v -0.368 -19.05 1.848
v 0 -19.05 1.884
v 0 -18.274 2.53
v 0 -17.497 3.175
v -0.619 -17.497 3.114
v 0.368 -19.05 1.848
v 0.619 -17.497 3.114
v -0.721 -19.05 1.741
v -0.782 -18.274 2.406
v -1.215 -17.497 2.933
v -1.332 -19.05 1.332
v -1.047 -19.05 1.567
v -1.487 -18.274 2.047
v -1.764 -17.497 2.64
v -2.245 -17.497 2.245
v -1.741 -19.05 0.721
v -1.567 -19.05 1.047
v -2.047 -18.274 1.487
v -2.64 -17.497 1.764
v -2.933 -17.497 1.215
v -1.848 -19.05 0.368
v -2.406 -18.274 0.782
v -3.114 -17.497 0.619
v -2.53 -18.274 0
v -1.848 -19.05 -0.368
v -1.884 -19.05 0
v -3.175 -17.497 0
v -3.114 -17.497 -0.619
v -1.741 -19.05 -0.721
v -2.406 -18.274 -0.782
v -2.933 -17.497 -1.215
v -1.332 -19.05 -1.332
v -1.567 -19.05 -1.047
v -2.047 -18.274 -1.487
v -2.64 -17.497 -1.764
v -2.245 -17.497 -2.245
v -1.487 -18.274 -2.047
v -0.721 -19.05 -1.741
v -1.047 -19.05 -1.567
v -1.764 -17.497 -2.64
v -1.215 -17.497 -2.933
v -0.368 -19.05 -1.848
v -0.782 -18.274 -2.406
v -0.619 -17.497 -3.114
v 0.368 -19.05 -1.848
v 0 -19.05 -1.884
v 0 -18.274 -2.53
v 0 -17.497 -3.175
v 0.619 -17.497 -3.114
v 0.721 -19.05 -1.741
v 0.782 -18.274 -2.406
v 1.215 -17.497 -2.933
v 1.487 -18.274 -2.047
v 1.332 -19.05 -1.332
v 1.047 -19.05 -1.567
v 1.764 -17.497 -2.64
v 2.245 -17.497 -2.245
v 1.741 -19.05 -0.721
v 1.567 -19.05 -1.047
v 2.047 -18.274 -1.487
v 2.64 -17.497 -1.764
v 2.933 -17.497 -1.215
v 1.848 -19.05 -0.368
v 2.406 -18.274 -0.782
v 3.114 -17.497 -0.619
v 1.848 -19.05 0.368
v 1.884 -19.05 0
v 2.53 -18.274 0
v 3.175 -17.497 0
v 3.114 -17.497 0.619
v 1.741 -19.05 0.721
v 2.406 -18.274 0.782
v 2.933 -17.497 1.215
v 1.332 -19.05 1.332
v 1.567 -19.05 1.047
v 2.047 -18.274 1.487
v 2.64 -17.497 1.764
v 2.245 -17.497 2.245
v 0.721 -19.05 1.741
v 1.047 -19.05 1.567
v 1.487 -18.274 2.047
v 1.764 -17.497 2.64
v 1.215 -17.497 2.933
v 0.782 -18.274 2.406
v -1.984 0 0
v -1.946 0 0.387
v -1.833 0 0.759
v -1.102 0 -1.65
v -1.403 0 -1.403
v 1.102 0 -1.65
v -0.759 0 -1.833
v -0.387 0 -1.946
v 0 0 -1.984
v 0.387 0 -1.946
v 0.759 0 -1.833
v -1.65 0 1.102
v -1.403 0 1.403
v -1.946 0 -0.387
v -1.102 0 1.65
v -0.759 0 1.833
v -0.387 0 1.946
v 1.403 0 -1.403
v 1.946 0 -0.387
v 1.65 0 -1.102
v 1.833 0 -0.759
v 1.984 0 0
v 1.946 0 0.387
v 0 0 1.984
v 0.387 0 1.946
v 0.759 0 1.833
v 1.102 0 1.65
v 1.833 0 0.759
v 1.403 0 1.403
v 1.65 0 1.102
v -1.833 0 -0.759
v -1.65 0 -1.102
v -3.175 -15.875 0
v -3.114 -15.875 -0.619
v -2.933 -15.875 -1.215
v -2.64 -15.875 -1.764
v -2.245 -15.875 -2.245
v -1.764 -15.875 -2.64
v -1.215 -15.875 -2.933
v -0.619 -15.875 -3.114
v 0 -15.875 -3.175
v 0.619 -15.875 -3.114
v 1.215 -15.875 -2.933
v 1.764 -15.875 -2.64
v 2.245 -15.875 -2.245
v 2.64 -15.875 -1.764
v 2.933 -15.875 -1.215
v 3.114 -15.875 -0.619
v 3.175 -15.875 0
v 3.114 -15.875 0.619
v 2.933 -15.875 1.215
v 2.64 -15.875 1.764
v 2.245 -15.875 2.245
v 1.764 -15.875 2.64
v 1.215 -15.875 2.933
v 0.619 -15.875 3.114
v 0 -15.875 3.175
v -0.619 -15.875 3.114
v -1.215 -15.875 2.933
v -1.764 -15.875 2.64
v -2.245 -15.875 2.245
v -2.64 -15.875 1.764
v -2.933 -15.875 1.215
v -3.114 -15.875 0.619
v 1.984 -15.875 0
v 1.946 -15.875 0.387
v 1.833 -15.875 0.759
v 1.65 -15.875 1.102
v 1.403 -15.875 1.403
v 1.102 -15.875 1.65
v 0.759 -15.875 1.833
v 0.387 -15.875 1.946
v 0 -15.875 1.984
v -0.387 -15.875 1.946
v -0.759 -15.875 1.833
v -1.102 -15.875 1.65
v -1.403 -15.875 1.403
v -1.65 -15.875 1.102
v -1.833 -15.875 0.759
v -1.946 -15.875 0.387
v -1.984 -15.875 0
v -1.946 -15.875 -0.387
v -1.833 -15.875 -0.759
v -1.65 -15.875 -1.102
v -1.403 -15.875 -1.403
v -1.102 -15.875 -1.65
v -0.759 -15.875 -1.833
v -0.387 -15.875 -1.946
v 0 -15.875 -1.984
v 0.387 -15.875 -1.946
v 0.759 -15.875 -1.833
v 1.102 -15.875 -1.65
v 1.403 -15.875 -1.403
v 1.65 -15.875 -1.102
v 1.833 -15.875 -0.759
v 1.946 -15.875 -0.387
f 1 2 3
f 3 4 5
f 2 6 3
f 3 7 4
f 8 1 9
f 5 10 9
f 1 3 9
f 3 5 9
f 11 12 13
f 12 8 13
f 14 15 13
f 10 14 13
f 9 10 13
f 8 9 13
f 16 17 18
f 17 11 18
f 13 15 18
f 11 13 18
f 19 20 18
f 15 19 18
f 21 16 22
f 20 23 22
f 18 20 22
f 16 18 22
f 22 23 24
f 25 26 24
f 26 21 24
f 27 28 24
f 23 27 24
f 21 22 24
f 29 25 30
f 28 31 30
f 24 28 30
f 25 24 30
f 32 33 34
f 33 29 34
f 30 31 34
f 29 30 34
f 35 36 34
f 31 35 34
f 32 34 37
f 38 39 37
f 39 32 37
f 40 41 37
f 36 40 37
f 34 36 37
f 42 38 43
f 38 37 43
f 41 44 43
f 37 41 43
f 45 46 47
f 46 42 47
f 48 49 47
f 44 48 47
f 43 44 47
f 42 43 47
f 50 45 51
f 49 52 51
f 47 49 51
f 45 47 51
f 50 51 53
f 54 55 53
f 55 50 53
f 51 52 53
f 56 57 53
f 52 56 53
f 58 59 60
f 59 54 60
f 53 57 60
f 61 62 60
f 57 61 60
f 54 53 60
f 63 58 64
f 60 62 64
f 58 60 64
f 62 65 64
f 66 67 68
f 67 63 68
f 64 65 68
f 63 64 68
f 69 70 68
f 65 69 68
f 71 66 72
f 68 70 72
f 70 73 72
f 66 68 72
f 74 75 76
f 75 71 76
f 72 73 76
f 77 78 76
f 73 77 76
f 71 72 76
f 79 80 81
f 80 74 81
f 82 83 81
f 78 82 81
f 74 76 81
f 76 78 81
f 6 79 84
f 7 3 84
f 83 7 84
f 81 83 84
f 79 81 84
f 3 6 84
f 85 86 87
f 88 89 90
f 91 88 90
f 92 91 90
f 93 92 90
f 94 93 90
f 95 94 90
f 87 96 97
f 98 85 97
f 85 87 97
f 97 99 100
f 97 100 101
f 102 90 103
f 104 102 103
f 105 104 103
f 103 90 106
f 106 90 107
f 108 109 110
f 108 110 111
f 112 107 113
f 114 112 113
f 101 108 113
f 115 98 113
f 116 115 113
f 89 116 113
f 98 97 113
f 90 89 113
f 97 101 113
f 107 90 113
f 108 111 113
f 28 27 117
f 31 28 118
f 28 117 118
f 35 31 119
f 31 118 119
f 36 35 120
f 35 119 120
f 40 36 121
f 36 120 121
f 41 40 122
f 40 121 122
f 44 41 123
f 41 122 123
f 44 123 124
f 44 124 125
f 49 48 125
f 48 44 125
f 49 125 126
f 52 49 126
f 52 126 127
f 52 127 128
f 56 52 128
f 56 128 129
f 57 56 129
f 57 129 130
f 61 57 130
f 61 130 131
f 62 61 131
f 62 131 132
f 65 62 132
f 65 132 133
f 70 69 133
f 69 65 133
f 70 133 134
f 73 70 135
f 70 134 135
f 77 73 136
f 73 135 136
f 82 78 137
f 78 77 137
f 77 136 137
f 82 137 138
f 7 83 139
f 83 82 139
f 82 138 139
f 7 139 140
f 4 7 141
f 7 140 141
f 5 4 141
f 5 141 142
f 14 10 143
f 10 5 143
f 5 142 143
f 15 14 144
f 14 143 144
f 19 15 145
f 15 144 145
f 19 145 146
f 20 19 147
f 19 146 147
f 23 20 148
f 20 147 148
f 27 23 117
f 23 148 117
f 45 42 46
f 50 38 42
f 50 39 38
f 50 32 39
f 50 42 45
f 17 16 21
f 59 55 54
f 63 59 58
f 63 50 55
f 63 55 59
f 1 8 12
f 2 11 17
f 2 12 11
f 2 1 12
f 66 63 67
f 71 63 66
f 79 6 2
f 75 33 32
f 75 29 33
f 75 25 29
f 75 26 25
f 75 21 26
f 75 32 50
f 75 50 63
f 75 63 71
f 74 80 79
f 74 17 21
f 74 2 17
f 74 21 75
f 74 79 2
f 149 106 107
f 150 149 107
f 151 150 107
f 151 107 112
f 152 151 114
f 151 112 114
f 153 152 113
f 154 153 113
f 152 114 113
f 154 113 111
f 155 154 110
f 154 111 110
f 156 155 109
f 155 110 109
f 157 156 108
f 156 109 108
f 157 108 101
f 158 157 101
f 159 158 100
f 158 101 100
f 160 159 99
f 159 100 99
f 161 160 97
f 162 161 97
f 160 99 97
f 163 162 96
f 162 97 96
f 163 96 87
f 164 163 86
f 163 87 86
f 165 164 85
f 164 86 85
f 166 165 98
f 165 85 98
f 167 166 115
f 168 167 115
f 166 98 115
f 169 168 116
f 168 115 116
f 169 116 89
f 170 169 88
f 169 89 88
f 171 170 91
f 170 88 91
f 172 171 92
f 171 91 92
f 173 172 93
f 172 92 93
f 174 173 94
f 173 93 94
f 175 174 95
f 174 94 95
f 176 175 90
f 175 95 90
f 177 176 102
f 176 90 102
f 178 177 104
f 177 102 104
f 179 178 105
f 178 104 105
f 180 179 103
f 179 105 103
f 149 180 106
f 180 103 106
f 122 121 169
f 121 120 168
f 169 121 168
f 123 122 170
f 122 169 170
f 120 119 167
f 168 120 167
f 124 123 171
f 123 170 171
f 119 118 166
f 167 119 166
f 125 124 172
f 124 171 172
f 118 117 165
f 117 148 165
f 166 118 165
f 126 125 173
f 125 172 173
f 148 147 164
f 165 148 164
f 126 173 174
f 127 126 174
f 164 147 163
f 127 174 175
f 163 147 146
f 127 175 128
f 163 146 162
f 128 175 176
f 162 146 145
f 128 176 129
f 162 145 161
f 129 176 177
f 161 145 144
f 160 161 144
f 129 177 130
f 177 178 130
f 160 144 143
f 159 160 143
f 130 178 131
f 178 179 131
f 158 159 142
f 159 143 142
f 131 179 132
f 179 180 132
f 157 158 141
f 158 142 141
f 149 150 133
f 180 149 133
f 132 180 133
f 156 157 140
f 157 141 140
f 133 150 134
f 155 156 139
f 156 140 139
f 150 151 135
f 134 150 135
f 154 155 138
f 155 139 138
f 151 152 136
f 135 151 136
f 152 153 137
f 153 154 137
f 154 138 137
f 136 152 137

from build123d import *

# Parameters (mm, degrees)
F1_DEPTH = 15.875
F3_DEPTH = 3.175


with BuildPart() as f1:
    # F0 (on Front) → F1 (new body)
    with BuildSketch(Plane.XZ):
        with BuildLine():
            ThreePointArc((-1.984375, 0), (0, -1.984375), (1.984375, 0))
            ThreePointArc((1.984375, 0), (0, 1.984375), (-1.984375, 0))
        make_face()
    extrude(amount=F1_DEPTH)

    # F2 (on face) → F3 (join)
    with BuildSketch(Plane.XZ.offset(15.875)):
        with BuildLine():
            ThreePointArc((3.175, 0), (0, 3.175), (-3.175, 0))
            ThreePointArc((-3.175, 0), (0, -3.175), (3.175, 0))
        make_face()
        with BuildLine():
            ThreePointArc((1.984375, 0), (0, -1.984375), (-1.984375, 0))
            ThreePointArc((-1.984375, 0), (0, 1.984375), (1.984375, 0))
        make_face(mode=Mode.SUBTRACT)
        with BuildLine():
            ThreePointArc((1.984375, 0), (0, 1.984375), (-1.984375, 0))
            ThreePointArc((-1.984375, 0), (0, -1.984375), (1.984375, 0))
        make_face()
    extrude(amount=F3_DEPTH)

    # F4 (on Right) → F5 (revolve, cut)
    with BuildSketch(Plane.YZ):
        Polygon((-19.8592845504, 1.2116890307), (-16.6845522668, 3.8504265809), (-19.8592845504, 3.8091964072), align=None)
    revolve(axis=Axis((0, -12.0745478198, 0), (0, -1, 0)), mode=Mode.SUBTRACT)


solid = f1.part
